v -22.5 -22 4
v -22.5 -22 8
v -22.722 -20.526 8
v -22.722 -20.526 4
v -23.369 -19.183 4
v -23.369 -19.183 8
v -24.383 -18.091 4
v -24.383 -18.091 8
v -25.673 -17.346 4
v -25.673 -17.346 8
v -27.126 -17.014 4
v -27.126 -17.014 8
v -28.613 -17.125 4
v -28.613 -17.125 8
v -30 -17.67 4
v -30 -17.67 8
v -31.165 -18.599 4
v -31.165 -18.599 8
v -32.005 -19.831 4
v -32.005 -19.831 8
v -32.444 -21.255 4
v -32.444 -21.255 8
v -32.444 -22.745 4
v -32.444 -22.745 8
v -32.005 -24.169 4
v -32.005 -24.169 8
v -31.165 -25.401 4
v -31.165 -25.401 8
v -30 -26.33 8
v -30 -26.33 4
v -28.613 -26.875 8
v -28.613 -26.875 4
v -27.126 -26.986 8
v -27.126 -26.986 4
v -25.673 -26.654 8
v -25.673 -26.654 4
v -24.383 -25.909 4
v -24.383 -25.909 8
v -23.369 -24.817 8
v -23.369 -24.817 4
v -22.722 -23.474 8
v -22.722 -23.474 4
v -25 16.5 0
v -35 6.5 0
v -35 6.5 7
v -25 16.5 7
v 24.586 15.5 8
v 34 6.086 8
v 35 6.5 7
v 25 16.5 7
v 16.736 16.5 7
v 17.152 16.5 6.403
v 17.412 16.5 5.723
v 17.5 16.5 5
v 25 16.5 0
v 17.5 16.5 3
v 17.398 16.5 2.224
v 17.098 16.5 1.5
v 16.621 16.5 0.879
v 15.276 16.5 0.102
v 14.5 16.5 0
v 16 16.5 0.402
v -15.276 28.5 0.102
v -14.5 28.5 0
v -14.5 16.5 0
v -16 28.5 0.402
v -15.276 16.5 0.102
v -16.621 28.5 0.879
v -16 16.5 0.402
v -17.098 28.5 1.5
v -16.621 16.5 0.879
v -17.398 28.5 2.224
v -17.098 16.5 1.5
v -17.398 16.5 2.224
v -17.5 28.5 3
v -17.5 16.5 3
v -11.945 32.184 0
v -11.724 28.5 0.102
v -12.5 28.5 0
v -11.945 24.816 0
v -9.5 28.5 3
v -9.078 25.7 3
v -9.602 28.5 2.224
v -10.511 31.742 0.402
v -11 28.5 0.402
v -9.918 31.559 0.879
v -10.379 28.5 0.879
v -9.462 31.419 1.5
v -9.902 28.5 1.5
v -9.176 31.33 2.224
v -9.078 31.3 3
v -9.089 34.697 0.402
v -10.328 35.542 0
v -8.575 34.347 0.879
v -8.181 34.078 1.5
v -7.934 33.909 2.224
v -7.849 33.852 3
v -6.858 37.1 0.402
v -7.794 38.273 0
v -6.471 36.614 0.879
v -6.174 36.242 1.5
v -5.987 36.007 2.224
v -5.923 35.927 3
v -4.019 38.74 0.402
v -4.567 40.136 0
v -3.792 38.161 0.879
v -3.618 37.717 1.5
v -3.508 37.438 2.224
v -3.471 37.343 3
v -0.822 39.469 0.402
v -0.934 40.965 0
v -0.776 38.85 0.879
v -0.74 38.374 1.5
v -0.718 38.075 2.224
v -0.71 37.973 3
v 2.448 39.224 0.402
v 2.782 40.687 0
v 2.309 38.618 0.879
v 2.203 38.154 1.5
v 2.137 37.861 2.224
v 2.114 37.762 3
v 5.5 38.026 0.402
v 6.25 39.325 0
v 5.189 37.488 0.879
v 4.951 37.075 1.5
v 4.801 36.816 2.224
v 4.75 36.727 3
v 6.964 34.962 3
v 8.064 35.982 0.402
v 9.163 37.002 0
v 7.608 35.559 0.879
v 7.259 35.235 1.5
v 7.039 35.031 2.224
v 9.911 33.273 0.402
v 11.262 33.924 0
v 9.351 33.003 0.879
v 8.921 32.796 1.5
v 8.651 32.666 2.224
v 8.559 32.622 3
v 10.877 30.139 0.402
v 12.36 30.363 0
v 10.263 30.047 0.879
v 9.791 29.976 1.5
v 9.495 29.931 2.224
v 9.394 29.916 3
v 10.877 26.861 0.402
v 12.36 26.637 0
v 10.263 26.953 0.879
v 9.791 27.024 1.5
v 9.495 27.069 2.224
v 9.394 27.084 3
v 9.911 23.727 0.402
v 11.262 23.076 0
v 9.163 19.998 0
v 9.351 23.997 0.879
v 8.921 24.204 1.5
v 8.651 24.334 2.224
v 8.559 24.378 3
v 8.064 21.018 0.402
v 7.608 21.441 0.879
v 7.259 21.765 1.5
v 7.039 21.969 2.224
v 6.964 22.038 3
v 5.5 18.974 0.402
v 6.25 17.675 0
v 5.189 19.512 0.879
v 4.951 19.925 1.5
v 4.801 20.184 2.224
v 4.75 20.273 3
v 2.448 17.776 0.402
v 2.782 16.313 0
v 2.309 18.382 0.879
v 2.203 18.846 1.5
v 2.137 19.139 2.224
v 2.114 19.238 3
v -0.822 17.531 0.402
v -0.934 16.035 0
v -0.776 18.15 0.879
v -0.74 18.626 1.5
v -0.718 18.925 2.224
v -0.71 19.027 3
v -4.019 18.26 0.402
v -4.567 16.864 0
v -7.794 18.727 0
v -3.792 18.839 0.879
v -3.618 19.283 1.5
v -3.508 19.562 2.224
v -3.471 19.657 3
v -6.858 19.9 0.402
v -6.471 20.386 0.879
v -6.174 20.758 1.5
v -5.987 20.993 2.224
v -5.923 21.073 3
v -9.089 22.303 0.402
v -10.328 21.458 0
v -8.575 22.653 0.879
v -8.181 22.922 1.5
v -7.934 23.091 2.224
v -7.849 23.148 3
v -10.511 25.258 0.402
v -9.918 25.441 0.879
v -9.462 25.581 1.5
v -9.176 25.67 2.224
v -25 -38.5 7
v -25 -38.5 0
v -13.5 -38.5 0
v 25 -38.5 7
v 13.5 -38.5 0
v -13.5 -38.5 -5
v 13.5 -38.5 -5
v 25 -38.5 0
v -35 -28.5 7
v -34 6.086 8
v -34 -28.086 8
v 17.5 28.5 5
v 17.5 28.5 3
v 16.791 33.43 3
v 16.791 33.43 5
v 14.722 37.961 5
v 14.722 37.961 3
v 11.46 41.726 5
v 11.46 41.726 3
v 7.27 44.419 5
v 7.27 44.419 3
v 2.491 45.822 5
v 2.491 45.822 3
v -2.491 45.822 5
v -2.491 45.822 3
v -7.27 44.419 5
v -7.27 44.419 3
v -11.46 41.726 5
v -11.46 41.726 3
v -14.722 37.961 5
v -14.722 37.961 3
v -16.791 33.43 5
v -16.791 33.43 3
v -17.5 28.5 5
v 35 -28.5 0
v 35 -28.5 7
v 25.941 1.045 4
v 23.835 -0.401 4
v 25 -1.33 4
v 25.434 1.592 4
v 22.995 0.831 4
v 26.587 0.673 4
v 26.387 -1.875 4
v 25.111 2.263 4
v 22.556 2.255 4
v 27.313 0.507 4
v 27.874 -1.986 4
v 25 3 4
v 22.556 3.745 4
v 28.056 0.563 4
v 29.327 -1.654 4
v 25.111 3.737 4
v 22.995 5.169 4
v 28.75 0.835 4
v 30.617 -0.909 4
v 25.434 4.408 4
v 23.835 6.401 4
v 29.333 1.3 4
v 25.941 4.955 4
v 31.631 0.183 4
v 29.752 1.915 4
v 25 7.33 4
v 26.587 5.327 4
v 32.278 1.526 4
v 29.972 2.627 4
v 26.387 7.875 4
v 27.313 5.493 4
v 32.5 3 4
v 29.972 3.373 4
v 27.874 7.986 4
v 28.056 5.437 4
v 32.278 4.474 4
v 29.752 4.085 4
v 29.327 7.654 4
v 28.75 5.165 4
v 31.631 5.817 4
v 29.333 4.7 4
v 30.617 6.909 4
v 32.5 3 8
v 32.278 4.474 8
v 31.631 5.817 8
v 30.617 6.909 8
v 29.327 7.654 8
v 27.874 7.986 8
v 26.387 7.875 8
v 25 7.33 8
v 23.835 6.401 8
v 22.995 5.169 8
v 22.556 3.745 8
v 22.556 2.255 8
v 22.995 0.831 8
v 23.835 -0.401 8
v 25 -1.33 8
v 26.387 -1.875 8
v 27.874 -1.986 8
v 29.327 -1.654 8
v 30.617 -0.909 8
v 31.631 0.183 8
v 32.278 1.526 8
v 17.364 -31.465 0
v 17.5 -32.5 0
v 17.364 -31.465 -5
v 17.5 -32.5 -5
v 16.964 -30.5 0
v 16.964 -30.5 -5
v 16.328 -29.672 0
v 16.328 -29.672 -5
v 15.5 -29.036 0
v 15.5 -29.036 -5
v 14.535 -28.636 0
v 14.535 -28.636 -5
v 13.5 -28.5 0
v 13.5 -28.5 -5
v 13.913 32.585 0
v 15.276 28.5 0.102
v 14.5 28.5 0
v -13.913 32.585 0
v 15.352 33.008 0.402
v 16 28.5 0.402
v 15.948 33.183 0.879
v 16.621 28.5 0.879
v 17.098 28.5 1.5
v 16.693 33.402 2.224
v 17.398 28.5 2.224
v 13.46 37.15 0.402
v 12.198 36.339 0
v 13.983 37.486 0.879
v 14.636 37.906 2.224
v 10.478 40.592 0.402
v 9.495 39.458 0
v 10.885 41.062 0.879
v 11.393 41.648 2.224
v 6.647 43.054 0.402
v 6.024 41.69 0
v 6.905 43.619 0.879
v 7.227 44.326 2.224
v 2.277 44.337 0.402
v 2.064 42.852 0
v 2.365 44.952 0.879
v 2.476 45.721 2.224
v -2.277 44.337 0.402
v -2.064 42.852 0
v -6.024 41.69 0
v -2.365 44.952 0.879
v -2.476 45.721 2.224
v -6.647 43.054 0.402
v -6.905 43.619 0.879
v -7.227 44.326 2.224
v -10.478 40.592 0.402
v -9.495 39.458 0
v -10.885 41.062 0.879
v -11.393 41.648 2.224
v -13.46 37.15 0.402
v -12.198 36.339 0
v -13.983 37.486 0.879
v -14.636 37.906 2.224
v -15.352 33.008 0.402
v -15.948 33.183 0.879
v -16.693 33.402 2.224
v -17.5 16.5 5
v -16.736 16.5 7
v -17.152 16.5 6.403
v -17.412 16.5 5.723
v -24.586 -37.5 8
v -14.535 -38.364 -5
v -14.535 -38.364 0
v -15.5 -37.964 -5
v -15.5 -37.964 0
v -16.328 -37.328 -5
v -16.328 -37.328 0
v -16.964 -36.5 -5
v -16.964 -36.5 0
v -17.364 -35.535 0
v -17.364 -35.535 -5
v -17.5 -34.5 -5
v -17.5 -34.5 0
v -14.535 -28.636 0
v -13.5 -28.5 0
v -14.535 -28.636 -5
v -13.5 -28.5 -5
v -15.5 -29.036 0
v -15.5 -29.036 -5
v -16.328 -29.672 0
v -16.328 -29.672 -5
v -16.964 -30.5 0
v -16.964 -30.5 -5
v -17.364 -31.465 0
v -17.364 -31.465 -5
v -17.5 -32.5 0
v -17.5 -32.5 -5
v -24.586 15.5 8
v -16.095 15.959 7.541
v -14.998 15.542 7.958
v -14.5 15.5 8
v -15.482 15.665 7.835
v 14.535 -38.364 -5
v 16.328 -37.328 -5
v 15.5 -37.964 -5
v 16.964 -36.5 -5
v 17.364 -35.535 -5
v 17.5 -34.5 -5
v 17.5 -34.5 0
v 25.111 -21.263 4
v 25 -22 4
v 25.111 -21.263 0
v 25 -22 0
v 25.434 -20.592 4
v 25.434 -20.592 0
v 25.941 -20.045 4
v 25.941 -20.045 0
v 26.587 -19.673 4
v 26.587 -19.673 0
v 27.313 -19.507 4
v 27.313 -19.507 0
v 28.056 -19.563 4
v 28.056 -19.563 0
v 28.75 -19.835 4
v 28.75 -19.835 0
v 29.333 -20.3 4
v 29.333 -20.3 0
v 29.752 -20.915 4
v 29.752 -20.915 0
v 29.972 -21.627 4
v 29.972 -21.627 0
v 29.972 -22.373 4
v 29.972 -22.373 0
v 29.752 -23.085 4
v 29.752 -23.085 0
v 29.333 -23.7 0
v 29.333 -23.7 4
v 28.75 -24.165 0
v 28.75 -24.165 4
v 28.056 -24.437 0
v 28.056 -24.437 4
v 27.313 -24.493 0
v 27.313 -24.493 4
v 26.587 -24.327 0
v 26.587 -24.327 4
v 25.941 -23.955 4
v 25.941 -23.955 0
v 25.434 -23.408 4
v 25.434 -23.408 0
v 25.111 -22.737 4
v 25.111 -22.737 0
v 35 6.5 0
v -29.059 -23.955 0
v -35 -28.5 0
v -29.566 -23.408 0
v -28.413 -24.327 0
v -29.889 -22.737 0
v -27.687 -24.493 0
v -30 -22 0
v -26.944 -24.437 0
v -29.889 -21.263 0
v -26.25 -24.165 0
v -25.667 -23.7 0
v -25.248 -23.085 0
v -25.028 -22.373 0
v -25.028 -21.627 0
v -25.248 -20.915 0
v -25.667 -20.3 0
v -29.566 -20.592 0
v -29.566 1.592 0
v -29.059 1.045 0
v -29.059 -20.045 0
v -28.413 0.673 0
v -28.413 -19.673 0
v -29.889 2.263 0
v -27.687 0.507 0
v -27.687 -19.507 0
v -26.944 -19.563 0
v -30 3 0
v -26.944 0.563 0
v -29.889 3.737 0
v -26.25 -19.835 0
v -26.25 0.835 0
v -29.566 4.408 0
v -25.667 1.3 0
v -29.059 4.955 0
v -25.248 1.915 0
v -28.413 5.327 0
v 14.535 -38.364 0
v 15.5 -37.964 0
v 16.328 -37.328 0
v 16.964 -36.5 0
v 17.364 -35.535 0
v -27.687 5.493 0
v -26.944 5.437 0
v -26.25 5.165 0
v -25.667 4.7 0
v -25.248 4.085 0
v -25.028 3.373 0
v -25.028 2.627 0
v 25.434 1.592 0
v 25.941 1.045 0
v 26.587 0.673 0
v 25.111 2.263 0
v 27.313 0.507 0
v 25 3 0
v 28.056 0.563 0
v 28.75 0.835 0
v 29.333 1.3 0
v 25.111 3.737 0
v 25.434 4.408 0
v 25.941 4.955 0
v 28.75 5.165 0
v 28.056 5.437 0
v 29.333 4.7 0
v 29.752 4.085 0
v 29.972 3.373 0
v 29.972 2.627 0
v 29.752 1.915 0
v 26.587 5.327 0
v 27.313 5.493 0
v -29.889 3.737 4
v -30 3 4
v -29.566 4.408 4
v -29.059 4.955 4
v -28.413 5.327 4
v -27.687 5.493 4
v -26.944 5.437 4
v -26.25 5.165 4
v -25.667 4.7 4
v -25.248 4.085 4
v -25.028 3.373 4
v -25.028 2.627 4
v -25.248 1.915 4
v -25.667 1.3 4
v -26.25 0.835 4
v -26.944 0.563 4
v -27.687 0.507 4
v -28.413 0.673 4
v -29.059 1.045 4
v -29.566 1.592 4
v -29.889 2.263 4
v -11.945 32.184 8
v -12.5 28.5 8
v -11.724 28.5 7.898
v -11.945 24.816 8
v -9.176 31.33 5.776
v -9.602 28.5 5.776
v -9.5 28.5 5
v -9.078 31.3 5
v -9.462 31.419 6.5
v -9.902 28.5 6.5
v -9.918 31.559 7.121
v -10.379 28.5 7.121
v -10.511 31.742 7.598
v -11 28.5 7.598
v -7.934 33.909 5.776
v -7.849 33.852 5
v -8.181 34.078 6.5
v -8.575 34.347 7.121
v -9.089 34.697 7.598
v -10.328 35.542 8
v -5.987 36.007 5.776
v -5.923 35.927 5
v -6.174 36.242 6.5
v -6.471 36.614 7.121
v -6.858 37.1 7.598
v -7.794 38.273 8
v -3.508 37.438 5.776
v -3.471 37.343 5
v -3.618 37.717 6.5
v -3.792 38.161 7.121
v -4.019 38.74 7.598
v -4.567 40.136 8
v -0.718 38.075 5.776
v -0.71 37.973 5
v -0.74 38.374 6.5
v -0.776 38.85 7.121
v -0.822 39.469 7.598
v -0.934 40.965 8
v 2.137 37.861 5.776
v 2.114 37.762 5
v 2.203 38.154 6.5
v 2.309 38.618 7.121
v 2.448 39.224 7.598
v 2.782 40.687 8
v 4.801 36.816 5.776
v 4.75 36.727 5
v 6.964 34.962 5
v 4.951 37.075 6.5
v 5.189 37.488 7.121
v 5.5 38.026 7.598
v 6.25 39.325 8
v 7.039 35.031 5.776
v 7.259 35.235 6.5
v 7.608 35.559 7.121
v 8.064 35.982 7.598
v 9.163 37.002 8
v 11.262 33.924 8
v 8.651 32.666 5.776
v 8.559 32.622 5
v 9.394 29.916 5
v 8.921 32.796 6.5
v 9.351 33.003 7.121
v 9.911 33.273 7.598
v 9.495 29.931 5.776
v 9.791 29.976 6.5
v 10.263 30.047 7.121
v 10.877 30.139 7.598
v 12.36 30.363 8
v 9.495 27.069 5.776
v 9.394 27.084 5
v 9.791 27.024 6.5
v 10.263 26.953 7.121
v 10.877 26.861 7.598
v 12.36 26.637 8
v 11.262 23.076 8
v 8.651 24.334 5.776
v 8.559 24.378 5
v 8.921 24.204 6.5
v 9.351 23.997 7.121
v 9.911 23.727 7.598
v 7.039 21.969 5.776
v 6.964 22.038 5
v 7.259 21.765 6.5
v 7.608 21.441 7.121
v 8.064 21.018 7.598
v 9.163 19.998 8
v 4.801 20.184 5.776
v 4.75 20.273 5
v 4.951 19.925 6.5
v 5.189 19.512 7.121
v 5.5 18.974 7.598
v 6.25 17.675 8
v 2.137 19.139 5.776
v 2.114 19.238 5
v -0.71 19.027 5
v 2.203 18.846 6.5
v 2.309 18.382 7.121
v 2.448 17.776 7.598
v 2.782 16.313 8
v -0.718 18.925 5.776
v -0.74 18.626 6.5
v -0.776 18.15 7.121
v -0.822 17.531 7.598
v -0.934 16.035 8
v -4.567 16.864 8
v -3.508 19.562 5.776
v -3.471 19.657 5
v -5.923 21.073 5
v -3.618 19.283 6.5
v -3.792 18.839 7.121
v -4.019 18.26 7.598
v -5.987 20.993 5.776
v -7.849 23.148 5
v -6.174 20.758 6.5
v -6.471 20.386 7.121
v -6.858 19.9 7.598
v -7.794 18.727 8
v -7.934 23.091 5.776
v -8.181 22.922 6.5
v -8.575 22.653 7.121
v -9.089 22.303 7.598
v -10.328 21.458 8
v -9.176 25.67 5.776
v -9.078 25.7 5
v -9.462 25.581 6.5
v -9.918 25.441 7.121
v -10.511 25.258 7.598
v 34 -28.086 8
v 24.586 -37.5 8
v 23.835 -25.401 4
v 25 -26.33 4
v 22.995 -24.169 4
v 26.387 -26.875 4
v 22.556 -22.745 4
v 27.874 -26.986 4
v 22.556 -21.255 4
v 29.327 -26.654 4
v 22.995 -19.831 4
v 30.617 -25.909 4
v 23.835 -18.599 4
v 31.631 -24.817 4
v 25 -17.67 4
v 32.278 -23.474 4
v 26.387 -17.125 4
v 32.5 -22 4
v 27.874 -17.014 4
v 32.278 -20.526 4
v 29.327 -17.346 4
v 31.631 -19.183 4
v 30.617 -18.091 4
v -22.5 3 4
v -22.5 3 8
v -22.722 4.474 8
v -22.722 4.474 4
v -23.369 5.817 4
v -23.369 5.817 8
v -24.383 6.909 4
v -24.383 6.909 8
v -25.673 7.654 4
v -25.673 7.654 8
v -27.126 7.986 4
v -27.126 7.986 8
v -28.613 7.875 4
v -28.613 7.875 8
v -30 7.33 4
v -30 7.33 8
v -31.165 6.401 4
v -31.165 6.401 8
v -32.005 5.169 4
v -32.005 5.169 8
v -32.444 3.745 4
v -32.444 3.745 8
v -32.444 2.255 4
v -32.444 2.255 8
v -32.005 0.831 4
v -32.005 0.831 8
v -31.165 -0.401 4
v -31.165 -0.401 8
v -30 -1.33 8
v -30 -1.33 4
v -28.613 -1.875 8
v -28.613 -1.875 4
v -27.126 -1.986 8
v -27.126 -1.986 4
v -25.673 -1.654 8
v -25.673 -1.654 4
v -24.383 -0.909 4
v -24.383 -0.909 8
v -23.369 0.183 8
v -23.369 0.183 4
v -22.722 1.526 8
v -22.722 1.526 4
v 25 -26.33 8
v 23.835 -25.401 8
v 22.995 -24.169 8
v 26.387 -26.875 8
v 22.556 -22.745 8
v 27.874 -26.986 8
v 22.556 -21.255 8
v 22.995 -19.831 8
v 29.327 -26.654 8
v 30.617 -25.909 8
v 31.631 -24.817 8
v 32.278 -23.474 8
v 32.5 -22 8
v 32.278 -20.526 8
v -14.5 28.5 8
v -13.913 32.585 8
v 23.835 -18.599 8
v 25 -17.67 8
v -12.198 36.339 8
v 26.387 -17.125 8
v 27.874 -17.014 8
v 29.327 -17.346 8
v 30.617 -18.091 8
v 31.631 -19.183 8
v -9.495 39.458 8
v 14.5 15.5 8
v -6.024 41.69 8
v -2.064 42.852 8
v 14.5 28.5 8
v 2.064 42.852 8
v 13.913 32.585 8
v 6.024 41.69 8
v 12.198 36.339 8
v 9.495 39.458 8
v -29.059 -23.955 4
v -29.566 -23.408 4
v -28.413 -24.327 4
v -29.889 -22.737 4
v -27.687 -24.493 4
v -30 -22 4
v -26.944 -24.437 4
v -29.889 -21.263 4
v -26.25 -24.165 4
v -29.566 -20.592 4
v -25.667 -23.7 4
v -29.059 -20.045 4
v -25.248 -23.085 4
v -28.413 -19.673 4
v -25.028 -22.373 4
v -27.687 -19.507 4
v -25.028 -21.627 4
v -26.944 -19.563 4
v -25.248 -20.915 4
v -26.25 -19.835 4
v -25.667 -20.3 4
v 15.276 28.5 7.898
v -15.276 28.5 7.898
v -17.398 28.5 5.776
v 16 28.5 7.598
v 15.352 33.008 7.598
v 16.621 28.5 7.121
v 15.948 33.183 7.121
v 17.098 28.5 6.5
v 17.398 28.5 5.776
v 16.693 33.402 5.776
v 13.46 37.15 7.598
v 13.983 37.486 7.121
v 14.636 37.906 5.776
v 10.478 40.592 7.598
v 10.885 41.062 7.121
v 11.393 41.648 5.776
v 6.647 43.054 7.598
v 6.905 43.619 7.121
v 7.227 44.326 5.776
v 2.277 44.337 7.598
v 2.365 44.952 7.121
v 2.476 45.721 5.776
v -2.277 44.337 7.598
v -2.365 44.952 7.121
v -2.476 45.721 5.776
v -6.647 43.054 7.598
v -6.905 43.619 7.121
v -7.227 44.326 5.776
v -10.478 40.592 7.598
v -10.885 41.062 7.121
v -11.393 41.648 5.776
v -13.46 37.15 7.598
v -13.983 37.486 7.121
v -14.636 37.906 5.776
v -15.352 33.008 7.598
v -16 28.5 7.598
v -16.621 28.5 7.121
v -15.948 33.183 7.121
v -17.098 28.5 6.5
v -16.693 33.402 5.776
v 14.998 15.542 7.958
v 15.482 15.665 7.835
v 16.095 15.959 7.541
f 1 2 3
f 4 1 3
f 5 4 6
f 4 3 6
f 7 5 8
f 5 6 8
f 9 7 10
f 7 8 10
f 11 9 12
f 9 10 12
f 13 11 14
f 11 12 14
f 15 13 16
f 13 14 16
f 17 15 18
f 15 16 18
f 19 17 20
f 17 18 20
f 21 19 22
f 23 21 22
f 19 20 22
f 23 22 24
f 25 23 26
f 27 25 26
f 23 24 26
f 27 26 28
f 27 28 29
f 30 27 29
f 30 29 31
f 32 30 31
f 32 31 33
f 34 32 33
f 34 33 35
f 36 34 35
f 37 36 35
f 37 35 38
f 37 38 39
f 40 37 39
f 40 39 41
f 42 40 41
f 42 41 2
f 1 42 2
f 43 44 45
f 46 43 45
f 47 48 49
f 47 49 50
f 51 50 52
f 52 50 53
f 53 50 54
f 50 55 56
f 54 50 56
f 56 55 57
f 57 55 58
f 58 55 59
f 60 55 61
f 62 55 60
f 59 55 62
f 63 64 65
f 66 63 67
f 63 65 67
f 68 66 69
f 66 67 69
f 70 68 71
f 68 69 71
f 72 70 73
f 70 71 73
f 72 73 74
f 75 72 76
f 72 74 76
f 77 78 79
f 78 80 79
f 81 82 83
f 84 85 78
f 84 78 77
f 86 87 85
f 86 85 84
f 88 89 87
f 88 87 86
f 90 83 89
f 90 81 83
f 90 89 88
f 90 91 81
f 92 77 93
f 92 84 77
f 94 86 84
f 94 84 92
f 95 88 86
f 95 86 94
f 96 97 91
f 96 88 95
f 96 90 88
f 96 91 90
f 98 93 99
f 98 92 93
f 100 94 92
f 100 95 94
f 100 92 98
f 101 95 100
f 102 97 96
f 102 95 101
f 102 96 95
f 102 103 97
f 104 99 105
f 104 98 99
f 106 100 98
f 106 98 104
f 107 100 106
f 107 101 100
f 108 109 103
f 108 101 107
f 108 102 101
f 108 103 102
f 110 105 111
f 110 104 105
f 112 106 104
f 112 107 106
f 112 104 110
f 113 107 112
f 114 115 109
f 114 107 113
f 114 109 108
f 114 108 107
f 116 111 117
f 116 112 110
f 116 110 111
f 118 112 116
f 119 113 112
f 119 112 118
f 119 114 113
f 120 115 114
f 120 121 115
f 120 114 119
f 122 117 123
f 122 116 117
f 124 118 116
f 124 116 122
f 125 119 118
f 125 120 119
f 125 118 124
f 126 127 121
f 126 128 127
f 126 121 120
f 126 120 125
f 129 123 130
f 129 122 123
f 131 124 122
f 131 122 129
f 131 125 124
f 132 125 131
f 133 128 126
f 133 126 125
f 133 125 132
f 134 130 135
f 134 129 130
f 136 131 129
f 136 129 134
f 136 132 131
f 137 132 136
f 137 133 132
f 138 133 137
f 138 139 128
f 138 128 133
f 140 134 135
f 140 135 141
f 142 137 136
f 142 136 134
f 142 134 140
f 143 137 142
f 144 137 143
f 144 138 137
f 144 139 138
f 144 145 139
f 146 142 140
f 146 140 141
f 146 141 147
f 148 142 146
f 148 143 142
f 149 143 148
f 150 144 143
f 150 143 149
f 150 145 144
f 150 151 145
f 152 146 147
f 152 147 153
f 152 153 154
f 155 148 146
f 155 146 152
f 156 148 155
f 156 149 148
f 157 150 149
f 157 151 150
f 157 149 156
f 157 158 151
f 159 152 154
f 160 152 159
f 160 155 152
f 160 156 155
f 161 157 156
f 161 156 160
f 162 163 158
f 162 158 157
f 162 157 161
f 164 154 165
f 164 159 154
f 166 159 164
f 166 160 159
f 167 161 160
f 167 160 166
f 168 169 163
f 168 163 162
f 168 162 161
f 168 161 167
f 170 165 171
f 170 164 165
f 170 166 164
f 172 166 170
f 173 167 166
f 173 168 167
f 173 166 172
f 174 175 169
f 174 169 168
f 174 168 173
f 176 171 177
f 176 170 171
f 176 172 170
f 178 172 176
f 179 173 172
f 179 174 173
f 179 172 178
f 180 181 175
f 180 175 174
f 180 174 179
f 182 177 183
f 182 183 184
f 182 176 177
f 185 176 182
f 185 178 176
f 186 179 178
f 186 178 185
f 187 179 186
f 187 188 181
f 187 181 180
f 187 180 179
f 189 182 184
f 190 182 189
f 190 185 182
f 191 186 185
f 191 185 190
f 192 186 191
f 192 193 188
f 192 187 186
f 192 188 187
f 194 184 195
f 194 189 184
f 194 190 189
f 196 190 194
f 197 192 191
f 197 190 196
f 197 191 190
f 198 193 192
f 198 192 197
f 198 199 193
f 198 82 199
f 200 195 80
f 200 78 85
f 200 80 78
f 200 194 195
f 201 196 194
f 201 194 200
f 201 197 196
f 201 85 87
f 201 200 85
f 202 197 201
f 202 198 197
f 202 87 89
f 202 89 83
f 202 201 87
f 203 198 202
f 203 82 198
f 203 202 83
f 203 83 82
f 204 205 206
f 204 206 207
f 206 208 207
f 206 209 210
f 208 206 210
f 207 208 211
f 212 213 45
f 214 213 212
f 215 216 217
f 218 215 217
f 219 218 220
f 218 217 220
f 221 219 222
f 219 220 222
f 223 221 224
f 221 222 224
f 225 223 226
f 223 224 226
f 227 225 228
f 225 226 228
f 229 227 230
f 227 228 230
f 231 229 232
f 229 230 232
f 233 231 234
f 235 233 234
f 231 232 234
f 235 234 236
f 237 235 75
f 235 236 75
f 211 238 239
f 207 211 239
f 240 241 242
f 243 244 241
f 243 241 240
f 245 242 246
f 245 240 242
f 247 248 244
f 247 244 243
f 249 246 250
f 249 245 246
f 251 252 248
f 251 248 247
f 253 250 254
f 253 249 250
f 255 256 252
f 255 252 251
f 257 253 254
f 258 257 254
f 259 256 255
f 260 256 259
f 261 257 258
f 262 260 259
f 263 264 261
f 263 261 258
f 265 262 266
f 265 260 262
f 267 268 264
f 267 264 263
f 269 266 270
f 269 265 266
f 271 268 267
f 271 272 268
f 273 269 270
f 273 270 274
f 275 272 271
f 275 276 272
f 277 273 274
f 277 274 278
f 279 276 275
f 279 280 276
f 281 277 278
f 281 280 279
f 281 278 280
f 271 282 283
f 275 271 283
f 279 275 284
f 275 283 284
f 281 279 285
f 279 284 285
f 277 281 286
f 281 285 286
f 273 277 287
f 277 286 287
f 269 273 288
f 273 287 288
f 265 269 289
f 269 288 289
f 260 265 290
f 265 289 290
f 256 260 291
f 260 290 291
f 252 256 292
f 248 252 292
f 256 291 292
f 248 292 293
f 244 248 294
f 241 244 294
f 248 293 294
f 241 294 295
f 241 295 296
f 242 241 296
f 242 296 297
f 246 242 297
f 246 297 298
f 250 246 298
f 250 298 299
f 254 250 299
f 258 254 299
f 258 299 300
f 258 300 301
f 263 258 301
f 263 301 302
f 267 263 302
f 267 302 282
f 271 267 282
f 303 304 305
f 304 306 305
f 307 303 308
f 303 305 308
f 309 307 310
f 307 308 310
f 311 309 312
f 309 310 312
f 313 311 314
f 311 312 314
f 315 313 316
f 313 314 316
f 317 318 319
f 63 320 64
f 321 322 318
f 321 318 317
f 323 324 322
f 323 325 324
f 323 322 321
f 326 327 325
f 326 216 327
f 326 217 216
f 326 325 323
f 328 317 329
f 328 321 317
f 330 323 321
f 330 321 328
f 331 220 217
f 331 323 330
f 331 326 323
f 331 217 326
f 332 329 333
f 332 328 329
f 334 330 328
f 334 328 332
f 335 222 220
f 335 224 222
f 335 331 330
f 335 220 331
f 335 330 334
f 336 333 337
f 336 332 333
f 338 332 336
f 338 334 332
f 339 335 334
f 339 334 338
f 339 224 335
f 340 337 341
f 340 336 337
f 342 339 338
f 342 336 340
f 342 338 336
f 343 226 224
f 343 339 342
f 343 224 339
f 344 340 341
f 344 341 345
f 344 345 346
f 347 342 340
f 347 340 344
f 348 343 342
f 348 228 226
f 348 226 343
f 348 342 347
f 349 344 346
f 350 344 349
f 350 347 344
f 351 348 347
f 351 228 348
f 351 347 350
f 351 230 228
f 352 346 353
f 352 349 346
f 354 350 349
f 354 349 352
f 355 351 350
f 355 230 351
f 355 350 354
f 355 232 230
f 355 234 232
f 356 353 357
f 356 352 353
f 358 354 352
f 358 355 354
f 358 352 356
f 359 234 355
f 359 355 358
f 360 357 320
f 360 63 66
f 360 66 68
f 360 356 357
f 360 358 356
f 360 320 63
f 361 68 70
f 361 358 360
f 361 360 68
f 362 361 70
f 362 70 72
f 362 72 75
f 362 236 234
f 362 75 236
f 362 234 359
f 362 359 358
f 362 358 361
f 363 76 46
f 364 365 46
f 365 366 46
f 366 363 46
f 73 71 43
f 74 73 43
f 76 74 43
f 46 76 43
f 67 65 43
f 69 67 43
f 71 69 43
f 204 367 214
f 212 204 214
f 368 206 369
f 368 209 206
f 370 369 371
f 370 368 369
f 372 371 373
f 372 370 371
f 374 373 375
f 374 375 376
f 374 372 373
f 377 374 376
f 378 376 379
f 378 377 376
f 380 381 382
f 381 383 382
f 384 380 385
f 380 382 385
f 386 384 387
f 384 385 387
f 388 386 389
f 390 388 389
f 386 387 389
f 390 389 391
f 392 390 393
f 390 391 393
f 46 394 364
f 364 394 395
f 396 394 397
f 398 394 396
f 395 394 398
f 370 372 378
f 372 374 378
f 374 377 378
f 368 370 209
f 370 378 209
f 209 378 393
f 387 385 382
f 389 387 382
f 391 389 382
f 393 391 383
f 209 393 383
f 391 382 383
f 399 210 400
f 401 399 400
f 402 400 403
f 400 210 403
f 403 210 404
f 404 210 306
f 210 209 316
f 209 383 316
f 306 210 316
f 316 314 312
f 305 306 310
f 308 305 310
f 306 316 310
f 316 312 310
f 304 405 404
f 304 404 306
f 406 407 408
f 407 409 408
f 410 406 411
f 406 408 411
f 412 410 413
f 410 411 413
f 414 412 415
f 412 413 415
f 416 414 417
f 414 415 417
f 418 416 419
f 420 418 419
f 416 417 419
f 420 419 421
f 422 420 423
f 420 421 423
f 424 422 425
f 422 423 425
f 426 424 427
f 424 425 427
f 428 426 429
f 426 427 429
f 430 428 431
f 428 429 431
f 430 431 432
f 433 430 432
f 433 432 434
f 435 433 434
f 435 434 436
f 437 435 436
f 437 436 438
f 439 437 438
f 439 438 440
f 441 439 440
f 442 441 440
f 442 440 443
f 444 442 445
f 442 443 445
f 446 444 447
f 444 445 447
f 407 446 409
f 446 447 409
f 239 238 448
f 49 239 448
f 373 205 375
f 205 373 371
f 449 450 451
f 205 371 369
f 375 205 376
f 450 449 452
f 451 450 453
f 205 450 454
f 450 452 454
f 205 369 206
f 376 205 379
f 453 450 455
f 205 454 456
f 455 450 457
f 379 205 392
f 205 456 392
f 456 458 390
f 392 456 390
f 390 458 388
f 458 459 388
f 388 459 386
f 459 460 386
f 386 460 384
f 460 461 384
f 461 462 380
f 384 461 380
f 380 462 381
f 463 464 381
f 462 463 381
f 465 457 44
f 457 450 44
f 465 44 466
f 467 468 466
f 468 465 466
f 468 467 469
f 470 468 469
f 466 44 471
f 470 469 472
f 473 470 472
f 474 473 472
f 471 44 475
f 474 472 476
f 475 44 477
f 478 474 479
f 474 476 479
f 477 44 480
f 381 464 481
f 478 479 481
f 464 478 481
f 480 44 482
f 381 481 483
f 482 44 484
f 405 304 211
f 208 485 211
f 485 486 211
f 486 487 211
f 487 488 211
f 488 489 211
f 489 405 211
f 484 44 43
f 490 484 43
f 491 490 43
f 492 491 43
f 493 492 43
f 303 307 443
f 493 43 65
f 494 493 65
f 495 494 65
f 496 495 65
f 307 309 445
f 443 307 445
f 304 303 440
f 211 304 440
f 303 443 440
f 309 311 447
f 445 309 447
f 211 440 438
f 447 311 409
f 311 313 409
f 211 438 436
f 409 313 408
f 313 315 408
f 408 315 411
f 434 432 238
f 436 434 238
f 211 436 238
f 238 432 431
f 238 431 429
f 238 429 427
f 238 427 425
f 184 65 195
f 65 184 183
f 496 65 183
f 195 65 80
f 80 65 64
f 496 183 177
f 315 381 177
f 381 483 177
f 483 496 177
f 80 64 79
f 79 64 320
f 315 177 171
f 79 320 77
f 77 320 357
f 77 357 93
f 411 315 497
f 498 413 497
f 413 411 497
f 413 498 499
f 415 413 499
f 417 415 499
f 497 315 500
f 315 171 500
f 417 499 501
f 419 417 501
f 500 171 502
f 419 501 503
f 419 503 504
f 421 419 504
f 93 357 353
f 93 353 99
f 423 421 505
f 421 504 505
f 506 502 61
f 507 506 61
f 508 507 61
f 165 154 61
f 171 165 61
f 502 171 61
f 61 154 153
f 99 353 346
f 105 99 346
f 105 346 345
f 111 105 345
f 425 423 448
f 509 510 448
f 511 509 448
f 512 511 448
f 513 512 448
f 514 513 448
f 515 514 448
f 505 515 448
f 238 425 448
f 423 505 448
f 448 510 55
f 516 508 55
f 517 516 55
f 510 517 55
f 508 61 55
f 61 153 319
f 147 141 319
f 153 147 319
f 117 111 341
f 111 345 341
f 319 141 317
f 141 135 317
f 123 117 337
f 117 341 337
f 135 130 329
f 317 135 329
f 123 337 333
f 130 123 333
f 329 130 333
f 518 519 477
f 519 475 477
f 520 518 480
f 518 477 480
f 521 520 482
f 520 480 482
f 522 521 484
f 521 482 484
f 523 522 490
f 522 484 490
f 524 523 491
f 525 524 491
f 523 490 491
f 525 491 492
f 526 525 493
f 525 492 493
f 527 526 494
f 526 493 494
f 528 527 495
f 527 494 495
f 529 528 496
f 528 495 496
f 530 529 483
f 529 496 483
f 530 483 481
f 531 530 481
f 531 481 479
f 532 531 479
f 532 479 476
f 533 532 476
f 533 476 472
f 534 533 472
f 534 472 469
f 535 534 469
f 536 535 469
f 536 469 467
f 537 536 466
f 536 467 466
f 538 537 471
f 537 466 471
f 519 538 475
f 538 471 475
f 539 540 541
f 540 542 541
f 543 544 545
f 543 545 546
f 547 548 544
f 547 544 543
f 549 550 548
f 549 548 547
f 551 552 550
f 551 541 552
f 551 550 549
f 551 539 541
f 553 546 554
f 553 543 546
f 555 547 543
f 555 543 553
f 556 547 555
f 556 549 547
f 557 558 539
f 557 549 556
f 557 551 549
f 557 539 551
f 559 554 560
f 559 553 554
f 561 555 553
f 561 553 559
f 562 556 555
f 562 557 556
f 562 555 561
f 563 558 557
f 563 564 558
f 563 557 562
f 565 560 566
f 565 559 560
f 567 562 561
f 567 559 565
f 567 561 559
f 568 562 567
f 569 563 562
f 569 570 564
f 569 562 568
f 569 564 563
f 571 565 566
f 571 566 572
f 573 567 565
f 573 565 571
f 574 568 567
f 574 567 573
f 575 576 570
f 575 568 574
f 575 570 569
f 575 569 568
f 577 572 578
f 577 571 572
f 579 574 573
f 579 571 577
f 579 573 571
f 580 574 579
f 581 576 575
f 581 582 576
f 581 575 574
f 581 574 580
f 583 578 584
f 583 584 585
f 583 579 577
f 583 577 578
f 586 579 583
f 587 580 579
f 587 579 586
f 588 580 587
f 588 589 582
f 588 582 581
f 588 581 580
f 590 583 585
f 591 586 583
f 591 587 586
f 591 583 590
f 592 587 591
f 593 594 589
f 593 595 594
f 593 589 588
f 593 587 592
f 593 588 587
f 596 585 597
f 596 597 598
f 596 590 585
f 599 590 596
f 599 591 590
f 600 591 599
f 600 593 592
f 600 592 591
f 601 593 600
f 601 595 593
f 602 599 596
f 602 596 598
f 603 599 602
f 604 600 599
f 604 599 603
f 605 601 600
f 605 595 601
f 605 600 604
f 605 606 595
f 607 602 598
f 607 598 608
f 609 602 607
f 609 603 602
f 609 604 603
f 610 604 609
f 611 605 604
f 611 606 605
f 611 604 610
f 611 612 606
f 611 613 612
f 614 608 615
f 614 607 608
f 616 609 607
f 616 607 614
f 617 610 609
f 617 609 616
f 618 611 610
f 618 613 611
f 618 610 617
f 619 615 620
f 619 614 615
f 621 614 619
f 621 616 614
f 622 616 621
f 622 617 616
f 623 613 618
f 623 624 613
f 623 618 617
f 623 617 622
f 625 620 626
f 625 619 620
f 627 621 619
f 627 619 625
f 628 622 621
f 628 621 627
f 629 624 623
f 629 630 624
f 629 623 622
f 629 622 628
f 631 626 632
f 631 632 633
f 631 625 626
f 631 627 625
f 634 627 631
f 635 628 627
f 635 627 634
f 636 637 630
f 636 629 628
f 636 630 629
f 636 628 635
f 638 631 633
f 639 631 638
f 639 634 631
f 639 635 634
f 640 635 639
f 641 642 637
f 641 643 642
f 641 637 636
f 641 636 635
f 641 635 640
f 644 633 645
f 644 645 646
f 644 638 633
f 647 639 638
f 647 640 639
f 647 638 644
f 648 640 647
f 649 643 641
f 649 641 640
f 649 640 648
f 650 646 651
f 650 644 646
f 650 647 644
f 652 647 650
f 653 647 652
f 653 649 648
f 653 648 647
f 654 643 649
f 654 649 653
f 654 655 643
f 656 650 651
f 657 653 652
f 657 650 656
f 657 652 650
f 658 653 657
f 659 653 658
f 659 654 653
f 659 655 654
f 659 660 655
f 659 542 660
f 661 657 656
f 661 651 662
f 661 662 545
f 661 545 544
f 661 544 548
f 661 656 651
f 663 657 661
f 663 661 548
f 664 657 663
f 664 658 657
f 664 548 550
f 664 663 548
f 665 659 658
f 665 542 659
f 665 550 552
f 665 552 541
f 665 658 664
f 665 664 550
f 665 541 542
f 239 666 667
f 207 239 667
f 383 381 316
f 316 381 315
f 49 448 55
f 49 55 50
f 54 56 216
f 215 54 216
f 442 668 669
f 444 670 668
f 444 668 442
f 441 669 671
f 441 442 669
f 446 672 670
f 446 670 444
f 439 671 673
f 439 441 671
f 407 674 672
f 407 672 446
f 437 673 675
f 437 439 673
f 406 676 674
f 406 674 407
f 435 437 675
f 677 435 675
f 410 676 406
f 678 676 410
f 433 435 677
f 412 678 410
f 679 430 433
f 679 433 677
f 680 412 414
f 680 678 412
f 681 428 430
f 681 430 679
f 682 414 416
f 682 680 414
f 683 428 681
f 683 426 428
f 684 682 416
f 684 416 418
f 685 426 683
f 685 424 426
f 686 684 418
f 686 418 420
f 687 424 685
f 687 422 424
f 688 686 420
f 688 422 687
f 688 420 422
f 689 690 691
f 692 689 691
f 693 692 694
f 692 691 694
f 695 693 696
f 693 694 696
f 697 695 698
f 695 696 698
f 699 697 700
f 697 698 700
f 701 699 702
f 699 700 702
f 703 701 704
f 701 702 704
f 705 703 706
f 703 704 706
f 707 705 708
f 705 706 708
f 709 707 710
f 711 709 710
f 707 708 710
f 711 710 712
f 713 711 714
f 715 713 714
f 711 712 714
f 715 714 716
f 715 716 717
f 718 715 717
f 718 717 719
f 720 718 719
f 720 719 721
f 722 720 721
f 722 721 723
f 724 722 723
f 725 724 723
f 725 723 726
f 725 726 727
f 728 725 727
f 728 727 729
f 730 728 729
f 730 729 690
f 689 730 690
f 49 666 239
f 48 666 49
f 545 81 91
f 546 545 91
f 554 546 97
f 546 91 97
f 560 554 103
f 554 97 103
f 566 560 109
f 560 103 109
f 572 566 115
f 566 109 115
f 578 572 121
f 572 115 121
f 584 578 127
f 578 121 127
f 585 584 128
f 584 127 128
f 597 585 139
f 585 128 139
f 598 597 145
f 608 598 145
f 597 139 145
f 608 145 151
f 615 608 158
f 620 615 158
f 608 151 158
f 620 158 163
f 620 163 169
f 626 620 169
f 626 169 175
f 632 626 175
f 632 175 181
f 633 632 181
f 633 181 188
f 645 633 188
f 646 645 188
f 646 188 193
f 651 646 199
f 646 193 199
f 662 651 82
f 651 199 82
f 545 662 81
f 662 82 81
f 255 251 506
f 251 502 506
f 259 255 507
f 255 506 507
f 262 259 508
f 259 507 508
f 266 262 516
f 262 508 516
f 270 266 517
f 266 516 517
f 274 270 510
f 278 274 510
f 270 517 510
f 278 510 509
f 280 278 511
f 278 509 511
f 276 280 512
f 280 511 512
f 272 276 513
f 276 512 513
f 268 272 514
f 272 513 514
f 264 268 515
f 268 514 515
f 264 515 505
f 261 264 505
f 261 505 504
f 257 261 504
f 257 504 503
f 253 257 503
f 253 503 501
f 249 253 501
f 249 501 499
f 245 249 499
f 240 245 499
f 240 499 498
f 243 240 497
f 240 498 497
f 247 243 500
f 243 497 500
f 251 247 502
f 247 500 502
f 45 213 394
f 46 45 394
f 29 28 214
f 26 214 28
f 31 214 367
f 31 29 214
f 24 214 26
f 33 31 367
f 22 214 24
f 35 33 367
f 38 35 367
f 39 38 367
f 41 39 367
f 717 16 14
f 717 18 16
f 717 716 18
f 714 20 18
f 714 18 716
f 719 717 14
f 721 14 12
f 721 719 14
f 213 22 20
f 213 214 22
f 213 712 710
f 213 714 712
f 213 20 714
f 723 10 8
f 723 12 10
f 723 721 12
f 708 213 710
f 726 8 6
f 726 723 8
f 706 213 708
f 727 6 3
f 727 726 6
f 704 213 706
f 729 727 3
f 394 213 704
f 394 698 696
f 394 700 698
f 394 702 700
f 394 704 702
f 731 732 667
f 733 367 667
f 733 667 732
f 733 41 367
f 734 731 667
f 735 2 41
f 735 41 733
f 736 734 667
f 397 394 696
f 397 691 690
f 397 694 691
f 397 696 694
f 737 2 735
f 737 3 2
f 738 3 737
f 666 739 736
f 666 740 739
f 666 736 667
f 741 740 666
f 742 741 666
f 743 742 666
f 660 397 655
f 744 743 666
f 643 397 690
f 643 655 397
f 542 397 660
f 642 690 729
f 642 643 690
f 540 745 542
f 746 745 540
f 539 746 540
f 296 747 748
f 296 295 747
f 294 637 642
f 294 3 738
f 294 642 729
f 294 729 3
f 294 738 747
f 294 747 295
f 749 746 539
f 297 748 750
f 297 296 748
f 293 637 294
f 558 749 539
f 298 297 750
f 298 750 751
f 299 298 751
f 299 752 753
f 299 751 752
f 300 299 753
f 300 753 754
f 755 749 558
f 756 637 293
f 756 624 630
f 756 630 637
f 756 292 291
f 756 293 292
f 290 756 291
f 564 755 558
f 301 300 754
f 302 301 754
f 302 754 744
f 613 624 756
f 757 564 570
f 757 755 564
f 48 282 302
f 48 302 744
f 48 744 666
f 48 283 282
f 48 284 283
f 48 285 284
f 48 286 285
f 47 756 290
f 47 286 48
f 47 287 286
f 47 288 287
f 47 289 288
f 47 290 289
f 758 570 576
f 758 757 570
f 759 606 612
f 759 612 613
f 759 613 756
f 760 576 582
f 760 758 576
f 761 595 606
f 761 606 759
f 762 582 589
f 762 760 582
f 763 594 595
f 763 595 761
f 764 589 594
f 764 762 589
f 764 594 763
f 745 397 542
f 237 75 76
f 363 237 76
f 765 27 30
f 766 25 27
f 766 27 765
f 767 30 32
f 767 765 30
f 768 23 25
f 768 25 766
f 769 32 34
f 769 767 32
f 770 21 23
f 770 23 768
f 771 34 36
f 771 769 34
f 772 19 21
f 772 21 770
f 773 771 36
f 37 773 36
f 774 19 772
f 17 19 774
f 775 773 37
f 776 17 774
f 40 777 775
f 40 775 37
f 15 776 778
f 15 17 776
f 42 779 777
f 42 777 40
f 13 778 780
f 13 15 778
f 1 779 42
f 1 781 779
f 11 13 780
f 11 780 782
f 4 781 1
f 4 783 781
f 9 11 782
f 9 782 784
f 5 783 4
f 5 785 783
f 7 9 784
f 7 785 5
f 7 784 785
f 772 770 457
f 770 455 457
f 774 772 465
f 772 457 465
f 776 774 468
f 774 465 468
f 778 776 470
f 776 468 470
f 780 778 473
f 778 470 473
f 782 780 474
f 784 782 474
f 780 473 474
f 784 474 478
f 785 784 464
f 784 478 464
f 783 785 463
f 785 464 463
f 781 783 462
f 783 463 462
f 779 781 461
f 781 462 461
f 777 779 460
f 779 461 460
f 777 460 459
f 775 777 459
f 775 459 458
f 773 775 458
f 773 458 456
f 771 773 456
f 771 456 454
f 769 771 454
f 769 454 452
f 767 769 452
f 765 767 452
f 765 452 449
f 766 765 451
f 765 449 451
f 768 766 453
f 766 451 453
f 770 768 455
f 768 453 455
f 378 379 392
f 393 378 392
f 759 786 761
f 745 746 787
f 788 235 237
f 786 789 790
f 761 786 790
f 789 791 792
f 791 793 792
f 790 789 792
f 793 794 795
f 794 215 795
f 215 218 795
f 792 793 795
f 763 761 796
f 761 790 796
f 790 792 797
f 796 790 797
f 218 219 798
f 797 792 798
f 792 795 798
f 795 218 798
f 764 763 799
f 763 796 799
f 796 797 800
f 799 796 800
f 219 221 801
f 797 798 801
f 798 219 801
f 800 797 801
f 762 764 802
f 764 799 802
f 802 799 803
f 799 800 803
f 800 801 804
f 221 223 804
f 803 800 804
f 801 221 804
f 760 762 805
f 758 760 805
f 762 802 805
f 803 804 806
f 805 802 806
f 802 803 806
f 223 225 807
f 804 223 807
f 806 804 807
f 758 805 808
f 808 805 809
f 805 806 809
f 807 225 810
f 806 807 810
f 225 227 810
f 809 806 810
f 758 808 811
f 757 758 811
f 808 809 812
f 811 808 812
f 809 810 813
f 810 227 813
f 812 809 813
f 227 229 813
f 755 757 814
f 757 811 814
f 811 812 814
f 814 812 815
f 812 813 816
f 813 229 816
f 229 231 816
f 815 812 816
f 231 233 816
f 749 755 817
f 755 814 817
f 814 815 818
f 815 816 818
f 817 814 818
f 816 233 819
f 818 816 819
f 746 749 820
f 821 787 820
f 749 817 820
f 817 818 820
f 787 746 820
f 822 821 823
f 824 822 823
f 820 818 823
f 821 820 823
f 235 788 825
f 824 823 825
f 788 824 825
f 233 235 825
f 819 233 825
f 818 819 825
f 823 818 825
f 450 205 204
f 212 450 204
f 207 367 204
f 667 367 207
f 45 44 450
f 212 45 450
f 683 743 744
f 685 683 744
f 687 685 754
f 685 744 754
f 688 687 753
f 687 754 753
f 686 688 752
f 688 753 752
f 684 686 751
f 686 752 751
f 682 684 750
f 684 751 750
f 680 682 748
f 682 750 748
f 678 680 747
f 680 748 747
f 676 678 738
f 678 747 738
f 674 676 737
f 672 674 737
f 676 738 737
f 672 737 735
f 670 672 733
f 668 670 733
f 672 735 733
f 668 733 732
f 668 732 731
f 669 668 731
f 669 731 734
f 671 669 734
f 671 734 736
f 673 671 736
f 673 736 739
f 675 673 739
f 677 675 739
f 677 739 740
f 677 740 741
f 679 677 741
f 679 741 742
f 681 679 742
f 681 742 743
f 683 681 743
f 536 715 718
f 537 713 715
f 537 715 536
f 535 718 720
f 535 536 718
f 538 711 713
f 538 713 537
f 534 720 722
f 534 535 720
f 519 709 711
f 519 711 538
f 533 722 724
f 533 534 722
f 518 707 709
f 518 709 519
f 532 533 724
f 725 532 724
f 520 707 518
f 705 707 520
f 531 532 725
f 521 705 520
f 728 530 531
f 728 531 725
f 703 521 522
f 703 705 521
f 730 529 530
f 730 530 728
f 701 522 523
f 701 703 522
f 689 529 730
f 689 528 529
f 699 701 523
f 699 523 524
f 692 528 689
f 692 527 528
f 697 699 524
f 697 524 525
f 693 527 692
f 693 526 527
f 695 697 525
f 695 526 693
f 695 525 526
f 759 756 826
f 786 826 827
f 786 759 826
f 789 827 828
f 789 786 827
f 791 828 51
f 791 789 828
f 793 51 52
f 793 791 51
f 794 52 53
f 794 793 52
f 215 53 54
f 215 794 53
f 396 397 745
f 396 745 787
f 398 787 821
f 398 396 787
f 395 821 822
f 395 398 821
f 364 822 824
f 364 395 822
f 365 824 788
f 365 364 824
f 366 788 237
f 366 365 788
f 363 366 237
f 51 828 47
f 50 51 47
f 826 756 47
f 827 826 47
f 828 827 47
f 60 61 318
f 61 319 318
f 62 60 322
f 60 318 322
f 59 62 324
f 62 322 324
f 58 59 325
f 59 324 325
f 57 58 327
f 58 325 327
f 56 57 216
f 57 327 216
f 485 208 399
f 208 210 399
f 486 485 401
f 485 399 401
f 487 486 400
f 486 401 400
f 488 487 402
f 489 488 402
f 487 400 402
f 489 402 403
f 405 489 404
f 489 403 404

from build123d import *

# Parameters (mm, degrees)
F0_W           = 35
F0_H           = 45
F0_H_2         = 10
F1_DEPTH       = 8
F2_DEPTH       = 5
F3_R           = 4
F4_R           = 3
F5_SIZE        = 10
F7_D           = 5
F7_DEPTH       = 18
F7_CBORE_D     = 10
F7_CBORE_DEPTH = 4
F7_TIP         = 1.5021515476
F8_SIZE        = 1


with BuildPart() as f1:
    # F0 (on Top) → F1 (new body)
    with BuildSketch(Plane.XY):
        Polygon((-17.5, -28.5), (-17.5, 16.5), (-35, 16.5), (-35, -38.5), (-17.5, -38.5), align=None)
        with Locations((0, -6)):
            Rectangle(F0_W, F0_H)
        Polygon((35, 16.5), (17.5, 16.5), (17.5, -28.5), (17.5, -38.5), (35, -38.5), align=None)
        with Locations((0, -33.5)):
            Rectangle(F0_W, F0_H_2)
        with BuildLine():
            Line((9.5, 28.5), (17.5, 28.5))
            ThreePointArc((17.5, 28.5), (0, 46), (-17.5, 28.5))
            Line((-17.5, 28.5), (-9.5, 28.5))
            ThreePointArc((-9.5, 28.5), (0, 38), (9.5, 28.5))
        make_face()
        with BuildLine():
            Line((17.5, 16.5), (17.5, 28.5))
            Line((17.5, 28.5), (9.5, 28.5))
            ThreePointArc((9.5, 28.5), (0, 19), (-9.5, 28.5))
            Line((-9.5, 28.5), (-17.5, 28.5))
            Line((-17.5, 28.5), (-17.5, 16.5))
            Line((-17.5, 16.5), (17.5, 16.5))
        make_face()
    extrude(amount=F1_DEPTH)

    # F0 (on Top) → F2 (join)
    with BuildSketch(Plane.XY):
        with Locations((0, -33.5)):
            Rectangle(F0_W, F0_H_2)
    extrude(amount=-F2_DEPTH)

    # F3
    f3_edges = [f1.edges().sort_by_distance(p)[0] for p in [
        (17.5, -28.5, -2.5),
        (17.5, -38.5, -2.5),
        (-17.5, -28.5, -2.5),
        (-17.5, -38.5, -2.5),
    ]]
    fillet(f3_edges, radius=F3_R)

    # F4
    f4_edges = [f1.edges().sort_by_distance(p)[0] for p in [
        (0, 46, 8),
        (0, 46, 0),
        (9.5, 28.5, 0),
        (9.5, 28.5, 8),
    ]]
    fillet(f4_edges, radius=F4_R)

    # F5
    f5_edges = [f1.edges().sort_by_distance(p)[0] for p in [
        (-35, 16.5, 4),
        (35, 16.5, 4),
        (35, -38.5, 4),
        (-35, -38.5, 4),
    ]]
    chamfer(f5_edges, length=F5_SIZE)

    # F7
    with Locations(Plane.XY.offset(8)):
        with Locations((-27.5, 3), (27.5, 3), (27.5, -22), (-27.5, -22)):
            CounterBoreHole(F7_D / 2, F7_CBORE_D / 2, F7_CBORE_DEPTH, depth=F7_DEPTH)
            with Locations((0, 0, -(F7_DEPTH + F7_TIP / 2))):  # 118° drill point
                Cone(0, F7_D / 2, F7_TIP, mode=Mode.SUBTRACT)

    # F8
    f8_edges = [f1.edges().sort_by_distance(p)[0] for p in [
        (-35, -11, 8),
        (-30, 11.5, 8),
        (-30, -33.5, 8),
        (0, -38.5, 8),
        (30, -33.5, 8),
        (35, -11, 8),
        (30, 11.5, 8),
        (19.75, 16.5, 8),
        (-19.75, 16.5, 8),
    ]]
    chamfer(f8_edges, length=F8_SIZE)


solid = f1.part
